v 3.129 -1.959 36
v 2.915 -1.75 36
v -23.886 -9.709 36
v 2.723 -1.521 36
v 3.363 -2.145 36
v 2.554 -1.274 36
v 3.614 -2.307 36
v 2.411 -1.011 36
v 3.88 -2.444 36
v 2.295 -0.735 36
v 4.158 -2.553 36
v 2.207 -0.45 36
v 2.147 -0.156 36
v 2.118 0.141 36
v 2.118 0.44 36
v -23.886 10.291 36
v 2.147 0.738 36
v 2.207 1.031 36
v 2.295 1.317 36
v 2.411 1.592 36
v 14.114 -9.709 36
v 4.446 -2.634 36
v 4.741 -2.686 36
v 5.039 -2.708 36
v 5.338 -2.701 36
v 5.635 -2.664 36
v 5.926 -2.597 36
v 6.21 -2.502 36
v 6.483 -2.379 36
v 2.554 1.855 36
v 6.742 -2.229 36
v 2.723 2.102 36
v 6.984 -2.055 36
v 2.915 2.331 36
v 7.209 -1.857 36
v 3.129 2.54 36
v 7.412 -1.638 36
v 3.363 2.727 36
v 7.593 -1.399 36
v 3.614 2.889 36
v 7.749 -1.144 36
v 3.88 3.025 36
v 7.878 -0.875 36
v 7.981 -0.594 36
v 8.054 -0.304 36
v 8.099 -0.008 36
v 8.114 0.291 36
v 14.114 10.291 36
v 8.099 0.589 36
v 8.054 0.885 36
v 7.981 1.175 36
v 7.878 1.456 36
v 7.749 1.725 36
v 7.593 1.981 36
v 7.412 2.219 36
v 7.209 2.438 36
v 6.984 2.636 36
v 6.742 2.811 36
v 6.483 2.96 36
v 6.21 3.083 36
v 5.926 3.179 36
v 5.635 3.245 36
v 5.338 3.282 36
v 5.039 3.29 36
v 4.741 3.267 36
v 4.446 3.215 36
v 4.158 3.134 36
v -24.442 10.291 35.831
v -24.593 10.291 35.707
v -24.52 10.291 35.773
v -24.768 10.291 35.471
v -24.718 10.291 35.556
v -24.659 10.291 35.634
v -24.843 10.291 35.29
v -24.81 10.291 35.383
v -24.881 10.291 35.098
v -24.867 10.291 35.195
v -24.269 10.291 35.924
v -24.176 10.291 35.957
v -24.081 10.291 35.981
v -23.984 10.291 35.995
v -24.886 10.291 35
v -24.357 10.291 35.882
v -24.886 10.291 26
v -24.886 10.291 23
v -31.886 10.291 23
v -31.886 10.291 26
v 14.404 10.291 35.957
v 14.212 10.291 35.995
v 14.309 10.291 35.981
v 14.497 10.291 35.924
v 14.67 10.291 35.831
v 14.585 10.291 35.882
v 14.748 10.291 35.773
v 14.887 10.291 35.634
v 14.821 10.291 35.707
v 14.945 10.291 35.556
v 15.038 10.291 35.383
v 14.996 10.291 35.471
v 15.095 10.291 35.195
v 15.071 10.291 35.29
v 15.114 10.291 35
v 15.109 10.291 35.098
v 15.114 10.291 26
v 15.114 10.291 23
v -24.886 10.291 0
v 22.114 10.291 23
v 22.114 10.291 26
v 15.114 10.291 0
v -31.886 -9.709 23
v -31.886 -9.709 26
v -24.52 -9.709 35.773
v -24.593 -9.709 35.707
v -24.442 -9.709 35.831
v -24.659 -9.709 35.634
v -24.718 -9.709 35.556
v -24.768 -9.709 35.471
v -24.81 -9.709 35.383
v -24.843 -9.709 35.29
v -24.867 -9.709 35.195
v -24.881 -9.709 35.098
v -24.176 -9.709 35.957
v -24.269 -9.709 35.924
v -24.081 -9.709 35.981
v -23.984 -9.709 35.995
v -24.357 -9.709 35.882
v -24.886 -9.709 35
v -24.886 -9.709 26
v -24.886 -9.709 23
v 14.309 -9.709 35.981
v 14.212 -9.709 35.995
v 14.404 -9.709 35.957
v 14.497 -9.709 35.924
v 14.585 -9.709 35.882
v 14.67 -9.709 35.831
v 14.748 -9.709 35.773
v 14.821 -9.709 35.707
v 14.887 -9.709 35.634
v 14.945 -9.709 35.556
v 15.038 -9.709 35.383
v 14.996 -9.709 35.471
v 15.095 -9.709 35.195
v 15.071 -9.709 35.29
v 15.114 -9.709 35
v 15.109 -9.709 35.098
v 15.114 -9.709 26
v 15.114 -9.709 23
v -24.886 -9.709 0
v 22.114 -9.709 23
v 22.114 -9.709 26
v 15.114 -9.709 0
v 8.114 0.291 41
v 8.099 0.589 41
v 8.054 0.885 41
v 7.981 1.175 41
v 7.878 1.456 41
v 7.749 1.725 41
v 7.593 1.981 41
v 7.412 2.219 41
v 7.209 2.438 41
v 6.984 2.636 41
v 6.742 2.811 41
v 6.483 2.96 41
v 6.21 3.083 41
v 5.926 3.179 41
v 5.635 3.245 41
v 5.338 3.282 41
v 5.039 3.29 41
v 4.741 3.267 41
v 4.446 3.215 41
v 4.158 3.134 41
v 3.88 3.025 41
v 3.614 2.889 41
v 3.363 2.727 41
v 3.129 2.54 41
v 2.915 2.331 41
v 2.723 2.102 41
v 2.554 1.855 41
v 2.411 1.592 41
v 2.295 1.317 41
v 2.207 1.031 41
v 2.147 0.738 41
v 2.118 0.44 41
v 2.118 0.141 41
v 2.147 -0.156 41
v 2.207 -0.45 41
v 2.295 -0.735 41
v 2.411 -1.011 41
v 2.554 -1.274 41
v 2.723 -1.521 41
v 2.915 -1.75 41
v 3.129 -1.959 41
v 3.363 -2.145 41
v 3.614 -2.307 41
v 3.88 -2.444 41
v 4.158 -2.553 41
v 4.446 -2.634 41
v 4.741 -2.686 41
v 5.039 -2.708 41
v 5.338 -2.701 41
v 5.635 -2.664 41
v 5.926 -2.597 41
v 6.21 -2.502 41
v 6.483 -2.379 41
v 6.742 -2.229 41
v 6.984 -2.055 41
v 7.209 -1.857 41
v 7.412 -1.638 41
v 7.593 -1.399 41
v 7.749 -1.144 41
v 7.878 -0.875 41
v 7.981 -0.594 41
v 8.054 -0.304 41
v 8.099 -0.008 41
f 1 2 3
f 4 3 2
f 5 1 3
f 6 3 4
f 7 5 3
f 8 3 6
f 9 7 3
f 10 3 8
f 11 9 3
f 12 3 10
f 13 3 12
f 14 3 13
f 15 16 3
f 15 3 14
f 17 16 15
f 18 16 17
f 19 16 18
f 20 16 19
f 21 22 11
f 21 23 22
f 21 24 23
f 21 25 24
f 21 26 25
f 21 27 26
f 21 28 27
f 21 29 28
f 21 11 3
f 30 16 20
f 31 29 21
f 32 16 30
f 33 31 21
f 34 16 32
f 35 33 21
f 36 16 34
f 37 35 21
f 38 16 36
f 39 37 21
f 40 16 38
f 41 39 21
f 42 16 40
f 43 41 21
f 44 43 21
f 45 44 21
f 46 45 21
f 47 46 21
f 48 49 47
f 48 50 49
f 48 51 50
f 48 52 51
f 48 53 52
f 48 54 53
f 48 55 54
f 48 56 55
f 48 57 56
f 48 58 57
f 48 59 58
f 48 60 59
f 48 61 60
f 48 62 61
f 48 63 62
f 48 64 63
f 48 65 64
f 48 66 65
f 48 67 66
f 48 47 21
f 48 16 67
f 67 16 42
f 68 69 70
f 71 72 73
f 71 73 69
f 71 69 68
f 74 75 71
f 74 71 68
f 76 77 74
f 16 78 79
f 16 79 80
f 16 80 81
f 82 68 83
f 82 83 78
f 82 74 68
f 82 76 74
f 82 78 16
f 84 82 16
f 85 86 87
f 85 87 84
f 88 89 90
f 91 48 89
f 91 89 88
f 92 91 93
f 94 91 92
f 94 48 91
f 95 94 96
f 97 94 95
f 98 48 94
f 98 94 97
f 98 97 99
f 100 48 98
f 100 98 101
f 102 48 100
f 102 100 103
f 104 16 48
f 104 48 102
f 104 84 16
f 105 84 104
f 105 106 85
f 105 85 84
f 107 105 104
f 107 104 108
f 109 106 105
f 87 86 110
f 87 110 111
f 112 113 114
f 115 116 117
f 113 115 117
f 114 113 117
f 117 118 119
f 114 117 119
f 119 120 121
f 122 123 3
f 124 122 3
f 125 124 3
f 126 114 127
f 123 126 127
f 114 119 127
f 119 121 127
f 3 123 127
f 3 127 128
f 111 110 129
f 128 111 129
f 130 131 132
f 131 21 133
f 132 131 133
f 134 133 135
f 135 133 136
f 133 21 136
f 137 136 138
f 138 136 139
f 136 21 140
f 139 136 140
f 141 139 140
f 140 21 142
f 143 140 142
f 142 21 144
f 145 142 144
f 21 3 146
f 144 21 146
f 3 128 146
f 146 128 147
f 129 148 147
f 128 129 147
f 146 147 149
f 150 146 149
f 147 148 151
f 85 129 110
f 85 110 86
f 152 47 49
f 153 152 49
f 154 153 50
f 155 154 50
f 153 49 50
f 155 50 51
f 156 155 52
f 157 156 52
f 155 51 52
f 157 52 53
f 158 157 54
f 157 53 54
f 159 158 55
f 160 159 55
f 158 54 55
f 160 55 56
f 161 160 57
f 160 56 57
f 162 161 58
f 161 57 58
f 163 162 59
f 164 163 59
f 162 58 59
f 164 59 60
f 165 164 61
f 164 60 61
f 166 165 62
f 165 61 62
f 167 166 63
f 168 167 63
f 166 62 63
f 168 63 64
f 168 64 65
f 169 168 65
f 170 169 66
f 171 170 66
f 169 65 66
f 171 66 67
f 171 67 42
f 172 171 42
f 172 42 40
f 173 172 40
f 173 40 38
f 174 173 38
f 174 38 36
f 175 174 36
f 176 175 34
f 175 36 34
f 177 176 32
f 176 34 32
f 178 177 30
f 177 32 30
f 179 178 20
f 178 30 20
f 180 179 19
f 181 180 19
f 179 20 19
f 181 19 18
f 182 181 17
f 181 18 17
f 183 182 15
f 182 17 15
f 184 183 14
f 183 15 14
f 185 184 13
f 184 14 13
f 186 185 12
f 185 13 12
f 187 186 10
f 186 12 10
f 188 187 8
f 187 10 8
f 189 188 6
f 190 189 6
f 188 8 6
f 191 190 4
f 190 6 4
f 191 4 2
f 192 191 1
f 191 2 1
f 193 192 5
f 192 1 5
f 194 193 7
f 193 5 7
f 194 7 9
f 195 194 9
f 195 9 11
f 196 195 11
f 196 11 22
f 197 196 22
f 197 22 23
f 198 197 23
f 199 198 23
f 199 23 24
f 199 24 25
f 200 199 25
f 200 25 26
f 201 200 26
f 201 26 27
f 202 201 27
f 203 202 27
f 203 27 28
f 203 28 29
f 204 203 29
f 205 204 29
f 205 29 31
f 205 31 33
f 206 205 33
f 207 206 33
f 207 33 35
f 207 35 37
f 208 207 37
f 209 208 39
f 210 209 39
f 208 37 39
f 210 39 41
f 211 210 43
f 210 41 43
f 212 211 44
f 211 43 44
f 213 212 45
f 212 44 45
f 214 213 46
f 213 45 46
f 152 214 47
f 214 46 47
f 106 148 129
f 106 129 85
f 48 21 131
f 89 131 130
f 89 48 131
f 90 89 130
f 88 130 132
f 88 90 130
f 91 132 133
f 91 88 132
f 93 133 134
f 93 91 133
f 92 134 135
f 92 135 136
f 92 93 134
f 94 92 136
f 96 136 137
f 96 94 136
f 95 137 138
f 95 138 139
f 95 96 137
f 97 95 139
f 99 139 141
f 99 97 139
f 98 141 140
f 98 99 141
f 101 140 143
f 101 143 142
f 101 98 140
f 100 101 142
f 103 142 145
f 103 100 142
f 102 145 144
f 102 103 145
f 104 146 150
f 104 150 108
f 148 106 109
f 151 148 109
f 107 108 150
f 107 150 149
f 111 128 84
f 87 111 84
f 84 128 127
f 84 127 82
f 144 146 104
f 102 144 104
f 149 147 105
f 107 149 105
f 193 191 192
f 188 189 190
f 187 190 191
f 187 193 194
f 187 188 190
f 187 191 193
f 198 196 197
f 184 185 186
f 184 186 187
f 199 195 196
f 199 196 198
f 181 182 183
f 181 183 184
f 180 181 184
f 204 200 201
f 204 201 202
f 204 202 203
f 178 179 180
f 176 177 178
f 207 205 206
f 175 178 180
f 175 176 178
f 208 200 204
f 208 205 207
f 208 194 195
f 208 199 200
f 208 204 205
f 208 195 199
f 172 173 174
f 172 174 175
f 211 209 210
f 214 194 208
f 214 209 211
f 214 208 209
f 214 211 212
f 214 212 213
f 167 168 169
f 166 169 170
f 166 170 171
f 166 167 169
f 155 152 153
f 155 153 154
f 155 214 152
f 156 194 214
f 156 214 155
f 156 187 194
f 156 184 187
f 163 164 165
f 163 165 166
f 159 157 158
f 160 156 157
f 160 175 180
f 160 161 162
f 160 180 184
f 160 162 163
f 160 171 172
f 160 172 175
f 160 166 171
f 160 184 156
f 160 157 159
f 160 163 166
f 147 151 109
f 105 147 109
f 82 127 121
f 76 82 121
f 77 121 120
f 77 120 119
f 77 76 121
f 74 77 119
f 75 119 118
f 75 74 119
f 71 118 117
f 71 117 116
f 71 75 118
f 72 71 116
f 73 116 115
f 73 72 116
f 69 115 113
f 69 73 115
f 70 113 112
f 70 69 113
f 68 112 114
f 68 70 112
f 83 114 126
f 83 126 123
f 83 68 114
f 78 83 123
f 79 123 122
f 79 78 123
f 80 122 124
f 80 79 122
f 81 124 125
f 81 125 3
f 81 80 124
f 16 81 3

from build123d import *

# Parameters (mm, degrees)
ESQUISSE1_W        = 40
ESQUISSE1_H        = 20
BOSS_EXTRU_1_DEPTH = 36
ESQUISSE2_W        = 3
ESQUISSE2_H        = 20
BOSS_EXTRU_2_DEPTH = 7
ESQUISSE3_W        = 3
ESQUISSE3_H        = 20
BOSS_EXTRU_3_DEPTH = 7
ESQUISSE4_R        = 3
BOSS_EXTRU_4_DEPTH = 5
CONG_1_R           = 1


with BuildPart() as part:
    # Esquisse1 → Boss.-Extru.1 (new body)
    with BuildSketch(Plane.XY):
        with Locations((-4.886048962, 0.290697674)):
            Rectangle(ESQUISSE1_W, ESQUISSE1_H)
    extrude(amount=BOSS_EXTRU_1_DEPTH)

    # Esquisse2 → Boss.-Extru.2 (add)
    with BuildSketch(Plane(origin=(15.113951038, 0, 0), x_dir=(0, 0, -1), z_dir=(1, 0, 0))):
        with Locations((-24.5, 0.290697674)):
            Rectangle(ESQUISSE2_W, ESQUISSE2_H)
    extrude(amount=BOSS_EXTRU_2_DEPTH)

    # Esquisse3 → Boss.-Extru.3 (add)
    with BuildSketch(Plane.ZY.offset(24.886048962)):
        with Locations((24.5, 0.290697674)):
            Rectangle(ESQUISSE3_W, ESQUISSE3_H)
    extrude(amount=BOSS_EXTRU_3_DEPTH)

    # Esquisse4 → Boss.-Extru.4 (add)
    with BuildSketch(Plane.XY.offset(36)):
        with Locations((5.113951038, 0.290697674)):
            Circle(ESQUISSE4_R)
    extrude(amount=BOSS_EXTRU_4_DEPTH)

    # Congé1
    cong_1_edges = [part.edges().sort_by_distance(p)[0] for p in [
        (15.113951038, 0.290697674, 36),
        (-24.886048962, 0.290697674, 36),
    ]]
    fillet(cong_1_edges, radius=CONG_1_R)


solid = part.part
